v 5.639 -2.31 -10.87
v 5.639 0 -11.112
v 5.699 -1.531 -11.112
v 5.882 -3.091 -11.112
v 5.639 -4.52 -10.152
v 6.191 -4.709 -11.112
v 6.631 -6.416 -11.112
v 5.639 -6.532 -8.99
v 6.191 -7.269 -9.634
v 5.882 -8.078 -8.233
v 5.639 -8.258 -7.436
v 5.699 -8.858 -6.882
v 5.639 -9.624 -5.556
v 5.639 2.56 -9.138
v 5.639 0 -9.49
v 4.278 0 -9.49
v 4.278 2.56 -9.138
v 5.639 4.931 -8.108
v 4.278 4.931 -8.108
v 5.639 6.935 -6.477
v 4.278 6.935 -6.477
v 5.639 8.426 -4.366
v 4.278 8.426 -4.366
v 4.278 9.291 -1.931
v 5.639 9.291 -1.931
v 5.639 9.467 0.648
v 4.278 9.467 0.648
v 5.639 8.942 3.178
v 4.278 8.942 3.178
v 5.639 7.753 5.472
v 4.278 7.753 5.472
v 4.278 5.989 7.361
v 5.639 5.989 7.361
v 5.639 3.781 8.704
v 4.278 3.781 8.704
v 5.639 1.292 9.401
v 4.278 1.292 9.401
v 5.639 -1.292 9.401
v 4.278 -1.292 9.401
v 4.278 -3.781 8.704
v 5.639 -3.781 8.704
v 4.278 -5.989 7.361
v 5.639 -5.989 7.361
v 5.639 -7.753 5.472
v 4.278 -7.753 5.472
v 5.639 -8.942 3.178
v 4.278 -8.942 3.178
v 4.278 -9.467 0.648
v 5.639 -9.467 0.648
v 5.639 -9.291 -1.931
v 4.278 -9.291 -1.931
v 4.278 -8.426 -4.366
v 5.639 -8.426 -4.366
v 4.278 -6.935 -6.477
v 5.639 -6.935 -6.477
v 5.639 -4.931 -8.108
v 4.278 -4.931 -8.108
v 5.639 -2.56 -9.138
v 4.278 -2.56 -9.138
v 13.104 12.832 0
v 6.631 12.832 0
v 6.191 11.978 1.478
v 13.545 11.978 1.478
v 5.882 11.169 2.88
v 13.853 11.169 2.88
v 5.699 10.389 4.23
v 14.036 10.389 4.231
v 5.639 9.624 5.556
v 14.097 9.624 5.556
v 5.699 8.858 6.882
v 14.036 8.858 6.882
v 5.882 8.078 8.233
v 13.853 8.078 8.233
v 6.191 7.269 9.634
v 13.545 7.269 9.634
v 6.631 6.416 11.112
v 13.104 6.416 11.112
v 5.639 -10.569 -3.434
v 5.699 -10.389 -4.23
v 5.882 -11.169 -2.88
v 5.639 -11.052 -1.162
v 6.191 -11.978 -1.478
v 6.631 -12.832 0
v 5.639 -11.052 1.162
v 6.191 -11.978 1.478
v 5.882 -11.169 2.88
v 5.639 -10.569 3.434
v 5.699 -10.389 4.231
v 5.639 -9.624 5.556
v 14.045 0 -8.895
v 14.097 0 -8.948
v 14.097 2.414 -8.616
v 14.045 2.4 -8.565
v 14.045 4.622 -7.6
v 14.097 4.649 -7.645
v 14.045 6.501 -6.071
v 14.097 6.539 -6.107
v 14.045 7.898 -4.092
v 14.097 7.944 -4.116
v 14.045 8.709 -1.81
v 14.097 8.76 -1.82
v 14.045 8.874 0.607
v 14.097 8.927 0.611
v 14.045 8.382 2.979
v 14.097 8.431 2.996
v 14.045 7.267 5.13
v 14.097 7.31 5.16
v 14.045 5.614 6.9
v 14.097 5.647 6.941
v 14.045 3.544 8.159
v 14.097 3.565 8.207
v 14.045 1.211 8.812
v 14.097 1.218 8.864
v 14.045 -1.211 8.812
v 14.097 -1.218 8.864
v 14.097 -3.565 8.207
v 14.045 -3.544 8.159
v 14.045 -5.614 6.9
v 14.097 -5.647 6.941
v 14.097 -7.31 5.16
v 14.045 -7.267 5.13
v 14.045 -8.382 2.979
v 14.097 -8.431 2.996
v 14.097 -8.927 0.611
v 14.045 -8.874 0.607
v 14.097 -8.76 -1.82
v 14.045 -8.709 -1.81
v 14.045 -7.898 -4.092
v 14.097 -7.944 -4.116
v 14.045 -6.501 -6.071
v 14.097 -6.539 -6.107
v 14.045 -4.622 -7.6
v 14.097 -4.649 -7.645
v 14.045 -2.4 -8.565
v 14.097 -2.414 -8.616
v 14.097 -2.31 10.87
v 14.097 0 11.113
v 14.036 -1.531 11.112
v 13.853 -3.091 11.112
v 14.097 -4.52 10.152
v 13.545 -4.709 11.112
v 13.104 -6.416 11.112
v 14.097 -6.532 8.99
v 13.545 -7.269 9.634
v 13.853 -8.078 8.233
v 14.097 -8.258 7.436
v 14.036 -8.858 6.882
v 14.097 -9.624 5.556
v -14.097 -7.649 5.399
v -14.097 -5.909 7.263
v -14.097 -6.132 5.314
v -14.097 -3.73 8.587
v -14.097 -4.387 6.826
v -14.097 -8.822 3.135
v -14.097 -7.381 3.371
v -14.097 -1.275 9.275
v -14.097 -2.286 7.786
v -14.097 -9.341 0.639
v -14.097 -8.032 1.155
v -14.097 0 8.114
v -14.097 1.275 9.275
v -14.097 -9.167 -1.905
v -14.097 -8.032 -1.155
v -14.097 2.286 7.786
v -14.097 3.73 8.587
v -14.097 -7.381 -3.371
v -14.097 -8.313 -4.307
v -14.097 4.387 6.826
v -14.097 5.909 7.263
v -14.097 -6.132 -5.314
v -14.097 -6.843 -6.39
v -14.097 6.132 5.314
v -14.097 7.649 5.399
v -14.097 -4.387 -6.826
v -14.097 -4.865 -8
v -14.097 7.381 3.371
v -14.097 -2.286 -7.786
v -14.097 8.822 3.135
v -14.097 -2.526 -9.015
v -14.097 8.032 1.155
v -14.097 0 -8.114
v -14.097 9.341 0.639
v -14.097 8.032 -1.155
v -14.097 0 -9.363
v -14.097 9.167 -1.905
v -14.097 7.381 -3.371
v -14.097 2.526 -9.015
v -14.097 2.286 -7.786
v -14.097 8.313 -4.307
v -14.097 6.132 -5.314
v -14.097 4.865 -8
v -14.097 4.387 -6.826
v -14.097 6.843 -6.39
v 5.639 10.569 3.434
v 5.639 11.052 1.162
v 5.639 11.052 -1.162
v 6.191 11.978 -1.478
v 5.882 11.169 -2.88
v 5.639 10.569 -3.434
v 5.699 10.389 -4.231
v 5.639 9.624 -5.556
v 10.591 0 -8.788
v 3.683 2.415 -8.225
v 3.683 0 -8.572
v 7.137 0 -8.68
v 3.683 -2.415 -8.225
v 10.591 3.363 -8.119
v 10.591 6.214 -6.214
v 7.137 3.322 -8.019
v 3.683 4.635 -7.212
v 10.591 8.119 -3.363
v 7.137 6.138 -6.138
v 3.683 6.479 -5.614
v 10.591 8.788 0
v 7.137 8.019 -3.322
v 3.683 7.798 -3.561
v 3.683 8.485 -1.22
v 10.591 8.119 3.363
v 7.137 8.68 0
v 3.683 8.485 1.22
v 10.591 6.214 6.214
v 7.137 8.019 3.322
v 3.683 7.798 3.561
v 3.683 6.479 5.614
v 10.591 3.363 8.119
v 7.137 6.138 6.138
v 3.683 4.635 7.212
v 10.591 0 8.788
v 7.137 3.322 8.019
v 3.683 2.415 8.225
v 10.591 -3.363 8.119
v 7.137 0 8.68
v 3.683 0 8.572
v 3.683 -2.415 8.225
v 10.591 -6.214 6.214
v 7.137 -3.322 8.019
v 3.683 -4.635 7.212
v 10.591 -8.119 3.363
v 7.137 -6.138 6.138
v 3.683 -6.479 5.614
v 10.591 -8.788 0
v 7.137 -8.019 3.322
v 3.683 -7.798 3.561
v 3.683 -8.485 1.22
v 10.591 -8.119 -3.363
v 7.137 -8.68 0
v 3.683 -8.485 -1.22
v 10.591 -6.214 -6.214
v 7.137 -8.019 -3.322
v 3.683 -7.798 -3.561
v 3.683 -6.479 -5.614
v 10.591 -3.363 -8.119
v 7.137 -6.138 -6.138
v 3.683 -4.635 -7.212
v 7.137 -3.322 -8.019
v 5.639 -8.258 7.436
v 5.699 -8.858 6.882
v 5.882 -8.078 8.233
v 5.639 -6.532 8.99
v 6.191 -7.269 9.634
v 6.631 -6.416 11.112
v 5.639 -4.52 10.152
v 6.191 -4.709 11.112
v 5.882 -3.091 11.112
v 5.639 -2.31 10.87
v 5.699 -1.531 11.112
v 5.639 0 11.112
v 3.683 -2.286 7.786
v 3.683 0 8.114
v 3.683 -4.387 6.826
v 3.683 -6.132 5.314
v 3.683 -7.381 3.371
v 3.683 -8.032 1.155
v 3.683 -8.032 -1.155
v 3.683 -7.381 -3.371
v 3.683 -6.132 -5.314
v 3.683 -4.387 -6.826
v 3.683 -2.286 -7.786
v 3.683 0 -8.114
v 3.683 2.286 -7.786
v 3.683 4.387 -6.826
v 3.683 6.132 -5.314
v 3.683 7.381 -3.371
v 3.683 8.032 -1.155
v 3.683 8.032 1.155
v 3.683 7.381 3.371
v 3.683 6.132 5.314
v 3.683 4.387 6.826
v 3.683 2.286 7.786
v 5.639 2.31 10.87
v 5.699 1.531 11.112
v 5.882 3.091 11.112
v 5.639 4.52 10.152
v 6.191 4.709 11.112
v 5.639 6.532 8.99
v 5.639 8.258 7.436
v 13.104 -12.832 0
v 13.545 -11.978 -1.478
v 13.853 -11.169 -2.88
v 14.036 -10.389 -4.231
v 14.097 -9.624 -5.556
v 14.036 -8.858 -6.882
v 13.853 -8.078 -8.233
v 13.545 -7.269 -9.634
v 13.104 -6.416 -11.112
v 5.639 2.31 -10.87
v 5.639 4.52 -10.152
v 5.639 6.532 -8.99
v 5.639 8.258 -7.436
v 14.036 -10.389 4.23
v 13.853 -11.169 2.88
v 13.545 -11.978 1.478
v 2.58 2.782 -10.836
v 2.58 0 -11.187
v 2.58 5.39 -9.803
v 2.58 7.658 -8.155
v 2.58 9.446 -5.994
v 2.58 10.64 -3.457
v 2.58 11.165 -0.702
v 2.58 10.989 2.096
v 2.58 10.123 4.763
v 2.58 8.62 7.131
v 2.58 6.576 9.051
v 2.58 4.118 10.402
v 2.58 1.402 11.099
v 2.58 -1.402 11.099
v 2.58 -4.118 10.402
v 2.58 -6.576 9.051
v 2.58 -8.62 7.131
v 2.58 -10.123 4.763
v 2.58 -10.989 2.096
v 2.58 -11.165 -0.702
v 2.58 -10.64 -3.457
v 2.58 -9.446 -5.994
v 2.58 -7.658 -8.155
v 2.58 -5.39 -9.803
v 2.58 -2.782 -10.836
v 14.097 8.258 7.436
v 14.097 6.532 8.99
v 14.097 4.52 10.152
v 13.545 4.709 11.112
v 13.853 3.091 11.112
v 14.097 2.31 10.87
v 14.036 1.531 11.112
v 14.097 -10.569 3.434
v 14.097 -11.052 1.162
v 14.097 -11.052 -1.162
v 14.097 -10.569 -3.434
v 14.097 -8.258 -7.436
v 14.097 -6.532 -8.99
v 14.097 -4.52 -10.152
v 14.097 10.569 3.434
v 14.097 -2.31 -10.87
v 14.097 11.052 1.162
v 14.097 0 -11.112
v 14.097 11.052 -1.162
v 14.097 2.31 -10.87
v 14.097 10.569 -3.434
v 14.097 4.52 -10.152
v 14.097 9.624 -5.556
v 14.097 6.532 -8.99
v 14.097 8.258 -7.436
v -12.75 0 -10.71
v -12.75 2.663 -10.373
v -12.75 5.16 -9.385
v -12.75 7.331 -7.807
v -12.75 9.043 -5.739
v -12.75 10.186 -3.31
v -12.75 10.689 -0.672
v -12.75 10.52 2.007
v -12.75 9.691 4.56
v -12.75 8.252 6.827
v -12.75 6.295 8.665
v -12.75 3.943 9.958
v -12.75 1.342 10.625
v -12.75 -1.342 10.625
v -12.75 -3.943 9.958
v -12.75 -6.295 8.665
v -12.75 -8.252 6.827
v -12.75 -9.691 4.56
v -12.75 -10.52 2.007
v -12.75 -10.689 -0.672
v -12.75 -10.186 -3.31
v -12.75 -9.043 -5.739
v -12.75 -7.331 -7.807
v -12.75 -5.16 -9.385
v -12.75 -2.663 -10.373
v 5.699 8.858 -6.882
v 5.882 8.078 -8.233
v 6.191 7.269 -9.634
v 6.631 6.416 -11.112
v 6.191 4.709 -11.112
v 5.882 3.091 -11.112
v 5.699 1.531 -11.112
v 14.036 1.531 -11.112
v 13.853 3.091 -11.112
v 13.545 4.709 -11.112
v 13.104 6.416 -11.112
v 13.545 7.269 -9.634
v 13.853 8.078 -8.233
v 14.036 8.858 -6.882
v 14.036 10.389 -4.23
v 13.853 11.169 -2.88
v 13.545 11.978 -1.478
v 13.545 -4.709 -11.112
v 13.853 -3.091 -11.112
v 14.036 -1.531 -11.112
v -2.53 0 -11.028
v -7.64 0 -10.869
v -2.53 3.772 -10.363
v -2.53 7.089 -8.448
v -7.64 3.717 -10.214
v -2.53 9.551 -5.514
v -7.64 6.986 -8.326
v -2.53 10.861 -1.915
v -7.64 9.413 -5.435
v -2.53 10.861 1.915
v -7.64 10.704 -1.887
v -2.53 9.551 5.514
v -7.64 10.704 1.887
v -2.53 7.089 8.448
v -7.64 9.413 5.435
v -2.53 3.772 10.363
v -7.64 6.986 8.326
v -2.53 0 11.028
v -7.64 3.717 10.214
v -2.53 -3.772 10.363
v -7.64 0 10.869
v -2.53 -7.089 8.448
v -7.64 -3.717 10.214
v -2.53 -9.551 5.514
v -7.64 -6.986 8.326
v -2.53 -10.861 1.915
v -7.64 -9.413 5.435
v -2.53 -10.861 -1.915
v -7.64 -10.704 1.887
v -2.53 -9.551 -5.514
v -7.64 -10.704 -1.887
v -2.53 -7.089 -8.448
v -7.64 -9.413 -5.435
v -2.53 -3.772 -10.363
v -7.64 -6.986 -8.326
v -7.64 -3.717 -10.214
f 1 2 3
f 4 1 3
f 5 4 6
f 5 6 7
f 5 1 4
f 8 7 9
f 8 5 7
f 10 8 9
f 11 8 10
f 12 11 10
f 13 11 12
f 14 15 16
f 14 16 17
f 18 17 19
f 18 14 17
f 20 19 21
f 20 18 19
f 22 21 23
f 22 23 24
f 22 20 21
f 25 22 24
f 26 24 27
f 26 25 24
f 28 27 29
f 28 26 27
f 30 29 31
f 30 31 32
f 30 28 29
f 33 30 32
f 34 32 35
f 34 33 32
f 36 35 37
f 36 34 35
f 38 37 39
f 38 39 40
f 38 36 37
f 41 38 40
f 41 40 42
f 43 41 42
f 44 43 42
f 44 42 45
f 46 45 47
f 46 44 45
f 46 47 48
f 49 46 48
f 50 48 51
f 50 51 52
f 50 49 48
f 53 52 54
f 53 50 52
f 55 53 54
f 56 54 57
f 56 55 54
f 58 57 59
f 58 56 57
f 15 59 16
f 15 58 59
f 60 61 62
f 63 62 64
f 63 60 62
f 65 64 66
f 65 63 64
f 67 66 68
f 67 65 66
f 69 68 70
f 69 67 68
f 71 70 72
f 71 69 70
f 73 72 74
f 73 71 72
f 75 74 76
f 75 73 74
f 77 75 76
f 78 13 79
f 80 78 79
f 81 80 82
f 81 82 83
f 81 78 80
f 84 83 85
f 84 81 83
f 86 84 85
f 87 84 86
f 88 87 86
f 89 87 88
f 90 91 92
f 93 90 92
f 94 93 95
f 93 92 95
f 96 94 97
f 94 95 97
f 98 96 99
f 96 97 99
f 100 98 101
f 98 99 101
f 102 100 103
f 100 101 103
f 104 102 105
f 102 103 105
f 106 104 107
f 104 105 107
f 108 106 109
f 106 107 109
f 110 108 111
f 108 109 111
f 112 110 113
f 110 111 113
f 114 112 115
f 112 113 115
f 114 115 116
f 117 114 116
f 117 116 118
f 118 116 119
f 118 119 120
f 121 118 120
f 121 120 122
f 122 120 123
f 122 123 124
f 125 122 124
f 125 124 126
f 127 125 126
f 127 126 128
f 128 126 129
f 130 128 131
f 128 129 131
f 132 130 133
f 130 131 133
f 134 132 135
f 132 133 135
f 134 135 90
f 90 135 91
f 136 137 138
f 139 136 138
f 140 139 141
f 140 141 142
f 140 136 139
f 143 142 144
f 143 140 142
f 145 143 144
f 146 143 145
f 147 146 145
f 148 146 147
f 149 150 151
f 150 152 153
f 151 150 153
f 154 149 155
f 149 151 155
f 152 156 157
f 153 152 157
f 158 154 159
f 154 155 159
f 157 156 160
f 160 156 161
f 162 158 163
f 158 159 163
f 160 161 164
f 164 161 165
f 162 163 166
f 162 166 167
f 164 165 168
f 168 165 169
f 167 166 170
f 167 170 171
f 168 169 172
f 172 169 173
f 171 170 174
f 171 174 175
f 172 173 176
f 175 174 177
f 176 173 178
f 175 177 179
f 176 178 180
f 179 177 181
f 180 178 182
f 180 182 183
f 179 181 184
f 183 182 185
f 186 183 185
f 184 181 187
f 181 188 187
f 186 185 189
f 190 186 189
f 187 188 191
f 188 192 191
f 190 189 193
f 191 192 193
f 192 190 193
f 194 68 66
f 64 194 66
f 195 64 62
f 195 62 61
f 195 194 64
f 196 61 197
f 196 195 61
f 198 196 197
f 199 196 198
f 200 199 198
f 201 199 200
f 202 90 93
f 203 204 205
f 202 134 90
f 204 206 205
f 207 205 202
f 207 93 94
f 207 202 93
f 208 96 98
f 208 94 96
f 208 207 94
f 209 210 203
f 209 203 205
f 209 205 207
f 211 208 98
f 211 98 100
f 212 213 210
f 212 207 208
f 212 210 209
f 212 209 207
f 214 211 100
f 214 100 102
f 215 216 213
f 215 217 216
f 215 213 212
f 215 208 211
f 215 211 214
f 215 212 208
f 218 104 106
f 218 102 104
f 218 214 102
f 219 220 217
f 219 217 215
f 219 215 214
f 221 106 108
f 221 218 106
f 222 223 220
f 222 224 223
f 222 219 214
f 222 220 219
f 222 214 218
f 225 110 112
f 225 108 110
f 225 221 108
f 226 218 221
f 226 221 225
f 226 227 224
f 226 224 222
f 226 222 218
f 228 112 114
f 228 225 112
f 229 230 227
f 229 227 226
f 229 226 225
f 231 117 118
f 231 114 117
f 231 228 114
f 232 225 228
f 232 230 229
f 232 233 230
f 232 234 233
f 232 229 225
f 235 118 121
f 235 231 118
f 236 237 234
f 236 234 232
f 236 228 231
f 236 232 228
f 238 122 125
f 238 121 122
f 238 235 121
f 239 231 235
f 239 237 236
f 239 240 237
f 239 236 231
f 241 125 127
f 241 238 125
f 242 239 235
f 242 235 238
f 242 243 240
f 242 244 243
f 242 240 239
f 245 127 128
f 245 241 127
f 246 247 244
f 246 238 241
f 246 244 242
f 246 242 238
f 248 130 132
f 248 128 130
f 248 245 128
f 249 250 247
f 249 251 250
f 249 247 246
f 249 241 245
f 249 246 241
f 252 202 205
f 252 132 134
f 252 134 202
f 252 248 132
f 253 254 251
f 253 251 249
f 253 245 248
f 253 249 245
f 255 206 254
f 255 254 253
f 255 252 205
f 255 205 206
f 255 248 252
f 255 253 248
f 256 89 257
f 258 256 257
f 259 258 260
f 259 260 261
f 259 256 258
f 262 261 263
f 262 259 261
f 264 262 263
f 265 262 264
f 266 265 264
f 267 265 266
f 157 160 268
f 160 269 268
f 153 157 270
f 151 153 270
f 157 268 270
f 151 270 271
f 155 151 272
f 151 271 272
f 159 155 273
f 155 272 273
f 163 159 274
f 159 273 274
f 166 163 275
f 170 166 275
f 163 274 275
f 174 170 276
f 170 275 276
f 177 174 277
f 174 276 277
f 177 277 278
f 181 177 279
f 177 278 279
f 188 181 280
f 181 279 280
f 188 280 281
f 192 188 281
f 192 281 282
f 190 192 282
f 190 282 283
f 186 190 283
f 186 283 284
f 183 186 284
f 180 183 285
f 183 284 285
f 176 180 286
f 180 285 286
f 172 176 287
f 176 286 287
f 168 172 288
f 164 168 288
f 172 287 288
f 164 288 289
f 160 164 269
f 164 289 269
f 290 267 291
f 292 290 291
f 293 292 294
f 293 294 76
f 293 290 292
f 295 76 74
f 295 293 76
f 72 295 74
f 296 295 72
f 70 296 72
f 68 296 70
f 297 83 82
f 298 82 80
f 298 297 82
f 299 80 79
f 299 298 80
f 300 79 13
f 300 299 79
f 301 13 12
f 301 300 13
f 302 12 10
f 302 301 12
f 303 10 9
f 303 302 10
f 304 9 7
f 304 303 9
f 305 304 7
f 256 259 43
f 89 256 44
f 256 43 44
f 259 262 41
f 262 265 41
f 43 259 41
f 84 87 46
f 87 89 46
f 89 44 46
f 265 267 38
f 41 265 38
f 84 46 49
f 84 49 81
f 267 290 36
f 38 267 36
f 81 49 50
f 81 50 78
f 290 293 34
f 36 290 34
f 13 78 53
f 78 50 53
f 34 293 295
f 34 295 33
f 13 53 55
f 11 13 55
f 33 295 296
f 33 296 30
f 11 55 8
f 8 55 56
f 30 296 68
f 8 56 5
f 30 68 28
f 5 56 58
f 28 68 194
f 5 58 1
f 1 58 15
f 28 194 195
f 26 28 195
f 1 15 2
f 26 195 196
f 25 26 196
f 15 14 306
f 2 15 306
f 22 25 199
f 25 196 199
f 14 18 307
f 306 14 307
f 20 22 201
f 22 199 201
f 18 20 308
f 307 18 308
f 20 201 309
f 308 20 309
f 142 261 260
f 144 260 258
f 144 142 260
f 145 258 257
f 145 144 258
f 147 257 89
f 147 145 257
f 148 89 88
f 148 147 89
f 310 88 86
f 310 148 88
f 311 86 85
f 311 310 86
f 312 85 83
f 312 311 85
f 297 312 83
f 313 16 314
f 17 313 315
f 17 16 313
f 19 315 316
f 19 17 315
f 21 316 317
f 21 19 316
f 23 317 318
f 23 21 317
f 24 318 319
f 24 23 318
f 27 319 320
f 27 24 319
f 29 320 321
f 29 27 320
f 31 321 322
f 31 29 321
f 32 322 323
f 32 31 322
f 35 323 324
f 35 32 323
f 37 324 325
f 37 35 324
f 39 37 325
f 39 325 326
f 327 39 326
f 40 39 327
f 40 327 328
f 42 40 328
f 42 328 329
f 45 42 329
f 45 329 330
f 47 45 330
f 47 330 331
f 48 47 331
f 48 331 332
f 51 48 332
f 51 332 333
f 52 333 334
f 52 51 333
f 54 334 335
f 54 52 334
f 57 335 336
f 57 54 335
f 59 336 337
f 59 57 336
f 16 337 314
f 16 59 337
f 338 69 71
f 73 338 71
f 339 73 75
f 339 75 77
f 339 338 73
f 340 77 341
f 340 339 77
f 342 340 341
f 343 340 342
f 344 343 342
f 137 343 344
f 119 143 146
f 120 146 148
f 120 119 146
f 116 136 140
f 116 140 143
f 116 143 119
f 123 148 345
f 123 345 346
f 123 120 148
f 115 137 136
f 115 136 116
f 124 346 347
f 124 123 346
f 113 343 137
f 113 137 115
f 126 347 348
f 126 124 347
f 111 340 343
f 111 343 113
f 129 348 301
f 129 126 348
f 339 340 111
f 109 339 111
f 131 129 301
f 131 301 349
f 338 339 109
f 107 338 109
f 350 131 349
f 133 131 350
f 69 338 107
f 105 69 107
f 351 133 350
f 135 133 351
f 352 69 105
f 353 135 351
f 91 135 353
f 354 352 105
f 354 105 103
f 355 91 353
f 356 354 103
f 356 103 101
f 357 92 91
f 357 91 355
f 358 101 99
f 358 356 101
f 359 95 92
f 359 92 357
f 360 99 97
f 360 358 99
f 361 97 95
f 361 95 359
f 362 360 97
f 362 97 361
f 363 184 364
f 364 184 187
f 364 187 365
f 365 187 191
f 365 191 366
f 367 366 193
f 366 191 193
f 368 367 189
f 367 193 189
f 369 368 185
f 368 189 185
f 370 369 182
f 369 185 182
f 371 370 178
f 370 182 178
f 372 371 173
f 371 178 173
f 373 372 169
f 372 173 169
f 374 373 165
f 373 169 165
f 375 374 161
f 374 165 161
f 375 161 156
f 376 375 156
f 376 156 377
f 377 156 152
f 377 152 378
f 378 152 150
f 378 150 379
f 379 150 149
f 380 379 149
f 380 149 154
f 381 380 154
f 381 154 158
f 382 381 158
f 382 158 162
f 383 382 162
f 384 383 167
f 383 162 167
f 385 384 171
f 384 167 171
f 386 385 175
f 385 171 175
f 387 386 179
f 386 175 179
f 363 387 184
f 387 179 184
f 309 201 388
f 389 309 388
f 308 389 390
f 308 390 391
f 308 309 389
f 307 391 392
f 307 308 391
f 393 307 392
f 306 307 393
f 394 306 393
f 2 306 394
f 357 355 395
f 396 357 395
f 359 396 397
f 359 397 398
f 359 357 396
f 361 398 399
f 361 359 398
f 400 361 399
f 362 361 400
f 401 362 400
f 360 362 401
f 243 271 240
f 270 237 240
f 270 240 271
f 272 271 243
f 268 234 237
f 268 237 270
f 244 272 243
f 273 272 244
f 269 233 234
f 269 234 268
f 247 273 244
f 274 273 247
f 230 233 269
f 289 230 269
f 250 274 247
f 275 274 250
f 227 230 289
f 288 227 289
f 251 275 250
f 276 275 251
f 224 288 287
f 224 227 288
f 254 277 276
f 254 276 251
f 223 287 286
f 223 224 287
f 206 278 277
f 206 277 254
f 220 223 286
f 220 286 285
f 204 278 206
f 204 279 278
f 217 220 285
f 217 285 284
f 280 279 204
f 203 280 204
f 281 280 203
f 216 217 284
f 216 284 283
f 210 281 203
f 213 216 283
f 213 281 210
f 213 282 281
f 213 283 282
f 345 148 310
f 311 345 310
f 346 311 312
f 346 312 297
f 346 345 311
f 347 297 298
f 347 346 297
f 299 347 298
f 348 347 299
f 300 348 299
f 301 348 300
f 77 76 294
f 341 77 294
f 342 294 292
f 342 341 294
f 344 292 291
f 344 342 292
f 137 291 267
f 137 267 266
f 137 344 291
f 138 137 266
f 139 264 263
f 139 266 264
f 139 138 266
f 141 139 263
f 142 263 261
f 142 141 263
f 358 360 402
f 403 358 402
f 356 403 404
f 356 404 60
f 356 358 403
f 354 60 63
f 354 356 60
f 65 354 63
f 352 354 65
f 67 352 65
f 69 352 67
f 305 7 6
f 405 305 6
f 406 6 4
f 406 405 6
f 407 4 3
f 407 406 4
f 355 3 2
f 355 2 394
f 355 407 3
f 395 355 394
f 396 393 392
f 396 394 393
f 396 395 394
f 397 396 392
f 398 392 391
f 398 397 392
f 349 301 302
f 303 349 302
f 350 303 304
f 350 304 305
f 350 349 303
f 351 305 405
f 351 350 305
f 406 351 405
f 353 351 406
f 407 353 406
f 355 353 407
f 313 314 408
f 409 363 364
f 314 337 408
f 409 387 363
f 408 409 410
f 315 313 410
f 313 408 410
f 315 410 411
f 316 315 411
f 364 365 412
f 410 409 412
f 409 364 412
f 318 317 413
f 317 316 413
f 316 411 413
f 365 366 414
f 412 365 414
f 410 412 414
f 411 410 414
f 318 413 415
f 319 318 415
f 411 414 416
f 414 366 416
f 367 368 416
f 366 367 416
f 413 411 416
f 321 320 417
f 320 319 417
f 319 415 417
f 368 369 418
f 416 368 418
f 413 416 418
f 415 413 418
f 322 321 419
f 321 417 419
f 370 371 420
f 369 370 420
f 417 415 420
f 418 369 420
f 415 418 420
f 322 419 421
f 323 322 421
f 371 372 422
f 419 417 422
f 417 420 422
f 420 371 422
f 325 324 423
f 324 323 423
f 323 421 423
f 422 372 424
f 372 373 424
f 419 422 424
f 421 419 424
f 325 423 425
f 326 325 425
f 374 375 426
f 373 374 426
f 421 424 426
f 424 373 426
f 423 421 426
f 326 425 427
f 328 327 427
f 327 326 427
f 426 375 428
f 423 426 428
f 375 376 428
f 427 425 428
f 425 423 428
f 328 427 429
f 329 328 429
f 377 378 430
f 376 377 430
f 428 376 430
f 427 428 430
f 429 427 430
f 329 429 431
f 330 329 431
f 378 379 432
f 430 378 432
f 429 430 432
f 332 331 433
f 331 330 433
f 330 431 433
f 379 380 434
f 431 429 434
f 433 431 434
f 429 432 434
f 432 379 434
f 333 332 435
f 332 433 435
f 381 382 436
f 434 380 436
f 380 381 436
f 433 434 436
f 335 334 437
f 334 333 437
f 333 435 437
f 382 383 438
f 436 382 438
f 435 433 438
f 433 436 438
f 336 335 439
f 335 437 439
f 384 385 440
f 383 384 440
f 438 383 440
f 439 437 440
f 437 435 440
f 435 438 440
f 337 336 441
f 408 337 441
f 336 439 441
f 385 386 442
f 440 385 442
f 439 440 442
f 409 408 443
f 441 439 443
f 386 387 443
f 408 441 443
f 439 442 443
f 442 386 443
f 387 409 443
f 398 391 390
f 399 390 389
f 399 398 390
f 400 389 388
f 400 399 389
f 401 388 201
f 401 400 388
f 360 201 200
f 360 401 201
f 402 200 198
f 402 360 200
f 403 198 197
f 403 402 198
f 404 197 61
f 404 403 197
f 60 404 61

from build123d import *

# Parameters (mm, degrees)
SKETCH2_R          = 10.668
EXTRUDE1_DEPTH     = 28.194
EXTRUDE1_DRAFT     = -1.783333333
SKETCH5_OUTSIDE_W  = 100.882
SKETCH5_OUTSIDE_H  = 100.882
SKETCH5_OUTSIDE_R  = 9.362586861
CUT_EXTRUDE1_DEPTH = 33.580879133
CUT_EXTRUDE1_DRAFT = 45
SKETCH8_R          = 17.018
CUT_EXTRUDE4_DEPTH = 26.614719415
SKETCH9_OUTSIDE_W  = 32.068
SKETCH9_OUTSIDE_H  = 32.068
SKETCH9_OUTSIDE_R  = 9.489586861
CUT_EXTRUDE5_DEPTH = 1.360714286
SKETCH10_OUTSIDE_W = 82.558
SKETCH10_OUTSIDE_H = 82.558
SKETCH10_OUTSIDE_R = 9.489586861
CUT_EXTRUDE6_DEPTH = 25.296582495
CUT_EXTRUDE6_DRAFT = -45
EXTRUDE2_DEPTH     = 8.4582
SKETCH7_OUTSIDE_W  = 150.768
SKETCH7_OUTSIDE_H  = 154.058
SKETCH7_OUTSIDE_R  = 11.1125
CUT_EXTRUDE2_DEPTH = 33.934882333
CUT_EXTRUDE2_DRAFT = -60
SKETCH18_OUTSIDE_W = 67.856
SKETCH18_OUTSIDE_H = 71.146
SKETCH18_OUTSIDE_R = 11.1125
EXTRUDE3_DEPTH     = 10
EXTRUDE3_DRAFT     = -60
SKETCH11_R         = 8.5725
CUT_EXTRUDE7_DEPTH = 25.615711208
CUT_EXTRUDE7_DRAFT = -1.783333333
SKETCH16_R         = 8.947540861
CUT_EXTRUDE9_DEPTH = 6.35
CUT_EXTRUDE9_DRAFT = -45
SKETCH17_W         = 17.78
SKETCH17_H         = 8.114228224


with BuildPart() as part:
    # Sketch2 → Extrude1 (with draft: the straight prism first)
    with BuildSketch(Plane(origin=(-14.097, 0, 0), x_dir=(0, 0, -1), z_dir=(1, 0, 0))):
        Circle(SKETCH2_R)
    extrude(amount=EXTRUDE1_DEPTH)
    # Extrude1: the draft: its side faces are tilted about the plane it starts from
    extrude1_sides = [part.faces().sort_by_distance(p)[0] for p in [
        (0, 0, 10.668),
    ]]
    draft(extrude1_sides, Plane(origin=(-14.097, 0, 0), x_dir=(0, 0, -1), z_dir=(1, 0, 0)), EXTRUDE1_DRAFT)


with BuildPart() as cut_extrude1_tool:
    # Sketch5 outside → Cut-Extrude1 (with draft: the straight prism first)
    with BuildSketch(Plane(origin=(-14.097, 0, 0), x_dir=(0, 0, -1), z_dir=(1, 0, 0))):
        Rectangle(SKETCH5_OUTSIDE_W, SKETCH5_OUTSIDE_H)
        Circle(SKETCH5_OUTSIDE_R, mode=Mode.SUBTRACT)
    extrude(amount=CUT_EXTRUDE1_DEPTH)
    # Cut-Extrude1: the draft: its side faces are tilted about the plane it starts from
    cut_extrude1_sides = [cut_extrude1_tool.faces().sort_by_distance(p)[0] for p in [
        (2.693439567, -50.441, 0),
        (2.693439567, 0, -50.441),
        (2.693439567, 50.441, 0),
        (2.693439567, 0, 50.441),
        (2.693439567, 0, 9.362586861),
    ]]
    draft(cut_extrude1_sides, Plane(origin=(-14.097, 0, 0), x_dir=(0, 0, -1), z_dir=(1, 0, 0)), CUT_EXTRUDE1_DRAFT)


with BuildPart() as part_1:
    add(part.part)

    # Cut-Extrude1: cut by cut_extrude1_tool
    add(cut_extrude1_tool.part, mode=Mode.SUBTRACT)

    # Sketch8 → Cut-Extrude4 (cut, through all)
    with BuildSketch(Plane(origin=(5.6388, 0, 0), x_dir=(0, 0, -1), z_dir=(1, 0, 0))):
        Circle(SKETCH8_R)
    extrude(amount=CUT_EXTRUDE4_DEPTH, mode=Mode.SUBTRACT)

    # Sketch9 outside → Cut-Extrude5 (cut)
    with BuildSketch(Plane(origin=(5.6388, 0, 0), x_dir=(0, 0, -1), z_dir=(1, 0, 0))):
        Rectangle(SKETCH9_OUTSIDE_W, SKETCH9_OUTSIDE_H)
        Circle(SKETCH9_OUTSIDE_R, mode=Mode.SUBTRACT)
    extrude(amount=-CUT_EXTRUDE5_DEPTH, mode=Mode.SUBTRACT)


with BuildPart() as cut_extrude6_tool:
    # Sketch10 outside → Cut-Extrude6 (with draft: the straight prism first)
    with BuildSketch(Plane(origin=(4.278085714, 0, 0), x_dir=(0, 0, -1), z_dir=(1, 0, 0))):
        Rectangle(SKETCH10_OUTSIDE_W, SKETCH10_OUTSIDE_H)
        Circle(SKETCH10_OUTSIDE_R, mode=Mode.SUBTRACT)
    extrude(amount=-CUT_EXTRUDE6_DEPTH)
    # Cut-Extrude6: the draft: its side faces are tilted about the plane it starts from
    cut_extrude6_sides = [cut_extrude6_tool.faces().sort_by_distance(p)[0] for p in [
        (-8.370205533, -41.279, 0),
        (-8.370205533, 0, -41.279),
        (-8.370205533, 41.279, 0),
        (-8.370205533, 0, 41.279),
        (-8.370205533, 0, 9.489586861),
    ]]
    draft(cut_extrude6_sides, Plane(origin=(4.278085714, 0, 0), x_dir=(0, 0, -1), z_dir=(1, 0, 0)), CUT_EXTRUDE6_DRAFT)


with BuildPart() as part_2:
    add(part_1.part)

    # Cut-Extrude6: cut by cut_extrude6_tool
    add(cut_extrude6_tool.part, mode=Mode.SUBTRACT)

    # Sketch6 → Extrude2 (add)
    with BuildSketch(Plane(origin=(14.097, 0, 0), x_dir=(0, 0, -1), z_dir=(1, 0, 0))):
        Polygon((0, 12.831609733), (-11.1125, 6.415804866), (-11.1125, -6.415804866), (0, -12.831609733), (11.1125, -6.415804866), (11.1125, 6.415804866), align=None)
    extrude(amount=-EXTRUDE2_DEPTH)


with BuildPart() as cut_extrude2_tool:
    # Sketch7 outside → Cut-Extrude2 (with draft: the straight prism first)
    with BuildSketch(Plane(origin=(14.097, 0, 0), x_dir=(0, 0, -1), z_dir=(1, 0, 0))):
        Rectangle(SKETCH7_OUTSIDE_W, SKETCH7_OUTSIDE_H)
        Circle(SKETCH7_OUTSIDE_R, mode=Mode.SUBTRACT)
    extrude(amount=-CUT_EXTRUDE2_DEPTH)
    # Cut-Extrude2: the draft: its side faces are tilted about the plane it starts from
    cut_extrude2_sides = [cut_extrude2_tool.faces().sort_by_distance(p)[0] for p in [
        (-2.870441167, -77.029, 0),
        (-2.870441167, 0, -75.384),
        (-2.870441167, 77.029, 0),
        (-2.870441167, 0, 75.384),
        (-2.870441167, 0, 11.1125),
    ]]
    draft(cut_extrude2_sides, Plane(origin=(14.097, 0, 0), x_dir=(0, 0, -1), z_dir=(1, 0, 0)), CUT_EXTRUDE2_DRAFT)


with BuildPart() as part_3:
    add(part_2.part)

    # Cut-Extrude2: cut by cut_extrude2_tool
    add(cut_extrude2_tool.part, mode=Mode.SUBTRACT)


with BuildPart() as extrude3_tool:
    # Sketch18 outside → Extrude3 (with draft: the straight prism first)
    with BuildSketch(Plane.ZY.offset(-5.6388)):
        Rectangle(SKETCH18_OUTSIDE_W, SKETCH18_OUTSIDE_H)
        Circle(SKETCH18_OUTSIDE_R, mode=Mode.SUBTRACT)
    extrude(amount=-EXTRUDE3_DEPTH)
    # Extrude3: the draft: its side faces are tilted about the plane it starts from
    extrude3_sides = [extrude3_tool.faces().sort_by_distance(p)[0] for p in [
        (10.6388, -35.573, 0),
        (10.6388, 0, 33.928),
        (10.6388, 35.573, 0),
        (10.6388, 0, -33.928),
        (10.6388, 0, -11.1125),
    ]]
    draft(extrude3_sides, Plane.ZY.offset(-5.6388), EXTRUDE3_DRAFT)


with BuildPart() as part_4:
    add(part_3.part)

    # Extrude3: cut by extrude3_tool
    add(extrude3_tool.part, mode=Mode.SUBTRACT)


with BuildPart() as cut_extrude7_tool:
    # Sketch11 → Cut-Extrude7 (with draft: the straight prism first)
    with BuildSketch(Plane(origin=(3.683, 0, 0), x_dir=(0, 0, -1), z_dir=(1, 0, 0))):
        Circle(SKETCH11_R)
    extrude(amount=CUT_EXTRUDE7_DEPTH)
    # Cut-Extrude7: the draft: its side faces are tilted about the plane it starts from
    cut_extrude7_sides = [cut_extrude7_tool.faces().sort_by_distance(p)[0] for p in [
        (16.490855604, 0, 8.5725),
    ]]
    draft(cut_extrude7_sides, Plane(origin=(3.683, 0, 0), x_dir=(0, 0, -1), z_dir=(1, 0, 0)), CUT_EXTRUDE7_DRAFT)


with BuildPart() as part_5:
    add(part_4.part)

    # Cut-Extrude7: cut by cut_extrude7_tool
    add(cut_extrude7_tool.part, mode=Mode.SUBTRACT)


with BuildPart() as cut_extrude9_tool:
    # Sketch16 → Cut-Extrude9 (with draft: the straight prism first)
    with BuildSketch(Plane(origin=(14.097, 0, 0), x_dir=(0, 0, -1), z_dir=(1, 0, 0))):
        Circle(SKETCH16_R)
    extrude(amount=-CUT_EXTRUDE9_DEPTH)
    # Cut-Extrude9: the draft: its side faces are tilted about the plane it starts from
    cut_extrude9_sides = [cut_extrude9_tool.faces().sort_by_distance(p)[0] for p in [
        (10.922, 0, 8.947540861),
    ]]
    draft(cut_extrude9_sides, Plane(origin=(14.097, 0, 0), x_dir=(0, 0, -1), z_dir=(1, 0, 0)), CUT_EXTRUDE9_DRAFT)


with BuildPart() as part_6:
    add(part_5.part)

    # Cut-Extrude9: cut by cut_extrude9_tool
    add(cut_extrude9_tool.part, mode=Mode.SUBTRACT)

    # Sketch17 → Cut-Revolve1 (revolve, cut)
    with BuildSketch(Plane.XY, mode=Mode.PRIVATE) as cut_revolve1_sk:
        with Locations((-5.207, 4.057114112)):
            Rectangle(SKETCH17_W, SKETCH17_H)
    revolve(cut_revolve1_sk.sketch.rotate(Axis((-14.097, 0, 0), (1, 0, 0)), 90), axis=Axis((-14.097, 0, 0), (1, 0, 0)), mode=Mode.SUBTRACT)


solid = part_6.part
